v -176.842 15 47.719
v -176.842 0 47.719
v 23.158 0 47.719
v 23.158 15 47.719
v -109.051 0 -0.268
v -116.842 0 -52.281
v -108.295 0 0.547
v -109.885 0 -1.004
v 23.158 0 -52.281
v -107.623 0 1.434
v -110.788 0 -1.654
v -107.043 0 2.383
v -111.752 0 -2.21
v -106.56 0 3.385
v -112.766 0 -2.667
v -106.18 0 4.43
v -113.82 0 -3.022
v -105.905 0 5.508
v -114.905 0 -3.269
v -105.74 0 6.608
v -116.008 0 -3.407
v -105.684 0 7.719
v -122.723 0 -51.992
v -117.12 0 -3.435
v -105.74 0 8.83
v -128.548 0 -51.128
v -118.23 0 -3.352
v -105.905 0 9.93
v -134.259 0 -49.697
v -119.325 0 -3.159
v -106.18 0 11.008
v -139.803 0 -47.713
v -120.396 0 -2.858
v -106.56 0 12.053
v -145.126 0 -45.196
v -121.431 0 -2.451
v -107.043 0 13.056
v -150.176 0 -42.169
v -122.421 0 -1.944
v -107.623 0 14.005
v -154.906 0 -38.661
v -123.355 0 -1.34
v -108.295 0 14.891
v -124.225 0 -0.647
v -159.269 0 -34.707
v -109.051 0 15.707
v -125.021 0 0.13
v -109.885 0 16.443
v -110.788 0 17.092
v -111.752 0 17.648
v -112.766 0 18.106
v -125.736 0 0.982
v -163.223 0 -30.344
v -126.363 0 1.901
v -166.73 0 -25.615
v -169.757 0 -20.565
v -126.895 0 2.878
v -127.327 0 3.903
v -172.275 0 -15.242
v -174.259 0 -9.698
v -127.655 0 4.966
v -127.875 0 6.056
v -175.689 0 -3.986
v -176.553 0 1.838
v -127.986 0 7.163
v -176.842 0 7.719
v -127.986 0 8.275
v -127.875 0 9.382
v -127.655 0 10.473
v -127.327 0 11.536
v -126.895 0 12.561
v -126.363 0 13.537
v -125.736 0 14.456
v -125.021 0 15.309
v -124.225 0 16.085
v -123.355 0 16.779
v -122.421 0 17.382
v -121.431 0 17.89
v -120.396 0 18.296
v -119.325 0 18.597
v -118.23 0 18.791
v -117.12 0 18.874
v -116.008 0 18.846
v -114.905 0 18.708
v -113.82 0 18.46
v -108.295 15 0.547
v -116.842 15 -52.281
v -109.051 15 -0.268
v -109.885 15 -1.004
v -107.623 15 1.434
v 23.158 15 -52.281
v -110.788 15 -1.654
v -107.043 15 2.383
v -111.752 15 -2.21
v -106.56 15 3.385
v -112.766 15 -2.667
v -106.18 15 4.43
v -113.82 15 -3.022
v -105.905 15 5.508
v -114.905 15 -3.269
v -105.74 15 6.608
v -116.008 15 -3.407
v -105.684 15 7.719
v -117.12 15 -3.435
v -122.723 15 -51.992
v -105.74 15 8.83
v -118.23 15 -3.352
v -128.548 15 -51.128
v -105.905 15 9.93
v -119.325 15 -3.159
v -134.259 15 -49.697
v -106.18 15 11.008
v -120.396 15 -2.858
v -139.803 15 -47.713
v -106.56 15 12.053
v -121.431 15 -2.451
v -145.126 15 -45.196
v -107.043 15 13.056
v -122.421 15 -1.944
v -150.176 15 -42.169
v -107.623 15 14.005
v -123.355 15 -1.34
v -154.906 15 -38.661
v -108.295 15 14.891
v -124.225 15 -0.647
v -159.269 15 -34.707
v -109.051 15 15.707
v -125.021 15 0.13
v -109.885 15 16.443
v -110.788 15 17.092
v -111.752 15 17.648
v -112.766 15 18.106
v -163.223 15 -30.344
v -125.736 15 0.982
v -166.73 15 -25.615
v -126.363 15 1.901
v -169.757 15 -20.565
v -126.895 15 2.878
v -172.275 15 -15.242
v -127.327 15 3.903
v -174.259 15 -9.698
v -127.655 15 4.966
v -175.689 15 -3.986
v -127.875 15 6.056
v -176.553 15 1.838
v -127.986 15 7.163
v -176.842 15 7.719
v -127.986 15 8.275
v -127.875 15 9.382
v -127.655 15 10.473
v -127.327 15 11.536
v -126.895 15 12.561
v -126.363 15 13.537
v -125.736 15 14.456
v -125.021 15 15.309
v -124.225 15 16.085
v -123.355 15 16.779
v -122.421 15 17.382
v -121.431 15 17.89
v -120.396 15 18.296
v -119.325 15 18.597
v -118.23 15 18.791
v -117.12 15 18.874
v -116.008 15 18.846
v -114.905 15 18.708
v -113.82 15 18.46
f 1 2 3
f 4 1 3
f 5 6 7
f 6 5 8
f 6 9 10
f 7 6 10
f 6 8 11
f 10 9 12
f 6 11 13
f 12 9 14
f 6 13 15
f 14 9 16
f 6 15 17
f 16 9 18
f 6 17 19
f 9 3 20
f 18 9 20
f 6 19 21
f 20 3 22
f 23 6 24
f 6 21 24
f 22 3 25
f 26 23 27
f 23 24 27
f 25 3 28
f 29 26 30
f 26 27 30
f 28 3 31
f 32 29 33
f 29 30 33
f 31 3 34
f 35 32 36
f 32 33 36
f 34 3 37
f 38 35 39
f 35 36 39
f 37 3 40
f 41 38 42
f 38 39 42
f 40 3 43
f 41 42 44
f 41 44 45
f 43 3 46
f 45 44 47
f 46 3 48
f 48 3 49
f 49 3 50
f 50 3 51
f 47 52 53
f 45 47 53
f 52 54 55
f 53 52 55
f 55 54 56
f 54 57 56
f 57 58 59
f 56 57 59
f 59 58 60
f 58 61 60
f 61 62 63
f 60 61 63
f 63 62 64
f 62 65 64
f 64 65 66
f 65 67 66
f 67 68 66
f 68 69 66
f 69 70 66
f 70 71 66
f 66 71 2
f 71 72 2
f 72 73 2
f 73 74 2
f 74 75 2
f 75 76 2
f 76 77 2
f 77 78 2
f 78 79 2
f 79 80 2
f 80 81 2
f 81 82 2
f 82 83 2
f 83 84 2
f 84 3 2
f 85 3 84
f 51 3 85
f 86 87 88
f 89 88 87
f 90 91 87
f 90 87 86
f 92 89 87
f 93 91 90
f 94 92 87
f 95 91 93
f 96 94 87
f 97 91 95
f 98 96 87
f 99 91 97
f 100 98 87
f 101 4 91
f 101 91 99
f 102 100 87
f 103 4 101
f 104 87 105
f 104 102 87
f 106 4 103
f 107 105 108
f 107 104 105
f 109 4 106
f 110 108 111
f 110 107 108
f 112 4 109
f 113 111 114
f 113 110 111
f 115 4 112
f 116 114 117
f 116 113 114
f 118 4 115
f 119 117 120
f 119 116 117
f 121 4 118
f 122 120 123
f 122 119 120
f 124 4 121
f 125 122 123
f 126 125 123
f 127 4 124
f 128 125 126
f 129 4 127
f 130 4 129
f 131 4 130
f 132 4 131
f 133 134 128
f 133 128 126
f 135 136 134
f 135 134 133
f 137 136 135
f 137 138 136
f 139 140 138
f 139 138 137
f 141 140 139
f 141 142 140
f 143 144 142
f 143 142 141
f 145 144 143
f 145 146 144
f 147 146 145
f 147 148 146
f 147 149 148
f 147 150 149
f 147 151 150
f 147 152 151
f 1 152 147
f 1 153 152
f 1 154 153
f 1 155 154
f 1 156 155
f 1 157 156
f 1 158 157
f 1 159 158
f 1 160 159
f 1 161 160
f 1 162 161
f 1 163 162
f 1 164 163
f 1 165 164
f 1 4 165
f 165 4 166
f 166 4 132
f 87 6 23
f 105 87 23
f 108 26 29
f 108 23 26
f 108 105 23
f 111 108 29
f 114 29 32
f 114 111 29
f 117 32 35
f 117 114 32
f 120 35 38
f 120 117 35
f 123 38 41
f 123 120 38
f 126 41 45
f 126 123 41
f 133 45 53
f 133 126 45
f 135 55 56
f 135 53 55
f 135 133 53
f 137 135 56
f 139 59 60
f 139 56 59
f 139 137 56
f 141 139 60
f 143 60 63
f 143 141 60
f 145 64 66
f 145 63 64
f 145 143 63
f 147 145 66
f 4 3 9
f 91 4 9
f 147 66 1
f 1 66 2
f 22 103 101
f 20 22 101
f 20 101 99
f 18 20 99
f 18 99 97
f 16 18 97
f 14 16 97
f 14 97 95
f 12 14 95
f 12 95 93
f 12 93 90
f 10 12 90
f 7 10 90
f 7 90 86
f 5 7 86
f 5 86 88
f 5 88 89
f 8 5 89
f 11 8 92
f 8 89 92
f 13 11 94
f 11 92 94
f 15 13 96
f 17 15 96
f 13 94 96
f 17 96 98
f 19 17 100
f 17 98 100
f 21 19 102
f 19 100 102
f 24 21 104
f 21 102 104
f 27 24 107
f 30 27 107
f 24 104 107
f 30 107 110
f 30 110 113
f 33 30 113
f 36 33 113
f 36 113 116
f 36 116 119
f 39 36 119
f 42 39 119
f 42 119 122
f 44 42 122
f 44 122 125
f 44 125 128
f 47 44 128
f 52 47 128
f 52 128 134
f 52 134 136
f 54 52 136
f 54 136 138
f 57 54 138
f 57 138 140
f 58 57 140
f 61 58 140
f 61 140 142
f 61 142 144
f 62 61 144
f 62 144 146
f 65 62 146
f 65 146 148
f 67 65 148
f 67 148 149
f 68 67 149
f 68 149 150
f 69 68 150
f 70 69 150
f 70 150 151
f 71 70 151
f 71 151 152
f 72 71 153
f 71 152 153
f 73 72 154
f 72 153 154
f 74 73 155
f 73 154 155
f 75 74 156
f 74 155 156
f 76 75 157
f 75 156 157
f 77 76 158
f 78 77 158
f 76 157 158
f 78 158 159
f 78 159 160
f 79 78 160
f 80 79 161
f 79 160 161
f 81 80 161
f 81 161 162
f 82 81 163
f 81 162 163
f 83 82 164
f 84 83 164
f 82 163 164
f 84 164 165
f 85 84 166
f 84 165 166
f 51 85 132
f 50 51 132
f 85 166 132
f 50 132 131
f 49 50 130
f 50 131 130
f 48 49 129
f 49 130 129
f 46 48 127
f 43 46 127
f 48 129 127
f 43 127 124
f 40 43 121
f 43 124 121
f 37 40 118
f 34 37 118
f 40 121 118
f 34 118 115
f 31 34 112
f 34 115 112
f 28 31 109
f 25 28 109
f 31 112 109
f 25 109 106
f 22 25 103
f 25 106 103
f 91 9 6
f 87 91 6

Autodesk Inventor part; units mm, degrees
ref_plane "YZ Plane" through (0, 0, 0) normal (1, 0, 0) x (0, 1, 0)
ref_plane "XZ Plane" through (0, 0, 0) normal (0, 1, 0) x (-1, 0, 0)
ref_plane "XY Plane" through (0, 0, 0) normal (0, 0, 1) x (1, 0, 0)
sketch "Sketch1" plane through (0, 0, 0) normal (0, 1, 0) x (-1, 0, 0)
  line L0 (176.8421, 47.7193) -> (-23.1579, 47.7193)
  line L1 (-23.1579, 47.7193) -> (-23.1579, -52.2807)
  line L2 (-23.1579, -52.2807) -> (176.8421, -52.2807)
  line L3 (176.8421, -52.2807) -> (176.8421, 47.7193)
  point P0 (0, 0)
  dimension "d0" = 100
  dimension "d1" = 200
extrude "Extrusion1" add sketch "Sketch1" along normal blind 15
fillet "Fillet2" radius 60 1 edges at (-176.8421, 7.5, -52.2807)
sketch "Sketch2" plane through (0, 15, 0) normal (0, 1, 0) x (1, 0, 0)
  arc A0 (-116.8421, 52.2807) -> (-176.8421, -7.7193) centre (-116.8421, -7.7193) ccw projected
  circle A1 centre (-116.8421, -7.7193) radius 11.1579
  point P0 (0, 0)
extrude "Extrusion2" cut sketch "Sketch2" against normal blind 15
properties part number "PovorotBlockOsnova"
